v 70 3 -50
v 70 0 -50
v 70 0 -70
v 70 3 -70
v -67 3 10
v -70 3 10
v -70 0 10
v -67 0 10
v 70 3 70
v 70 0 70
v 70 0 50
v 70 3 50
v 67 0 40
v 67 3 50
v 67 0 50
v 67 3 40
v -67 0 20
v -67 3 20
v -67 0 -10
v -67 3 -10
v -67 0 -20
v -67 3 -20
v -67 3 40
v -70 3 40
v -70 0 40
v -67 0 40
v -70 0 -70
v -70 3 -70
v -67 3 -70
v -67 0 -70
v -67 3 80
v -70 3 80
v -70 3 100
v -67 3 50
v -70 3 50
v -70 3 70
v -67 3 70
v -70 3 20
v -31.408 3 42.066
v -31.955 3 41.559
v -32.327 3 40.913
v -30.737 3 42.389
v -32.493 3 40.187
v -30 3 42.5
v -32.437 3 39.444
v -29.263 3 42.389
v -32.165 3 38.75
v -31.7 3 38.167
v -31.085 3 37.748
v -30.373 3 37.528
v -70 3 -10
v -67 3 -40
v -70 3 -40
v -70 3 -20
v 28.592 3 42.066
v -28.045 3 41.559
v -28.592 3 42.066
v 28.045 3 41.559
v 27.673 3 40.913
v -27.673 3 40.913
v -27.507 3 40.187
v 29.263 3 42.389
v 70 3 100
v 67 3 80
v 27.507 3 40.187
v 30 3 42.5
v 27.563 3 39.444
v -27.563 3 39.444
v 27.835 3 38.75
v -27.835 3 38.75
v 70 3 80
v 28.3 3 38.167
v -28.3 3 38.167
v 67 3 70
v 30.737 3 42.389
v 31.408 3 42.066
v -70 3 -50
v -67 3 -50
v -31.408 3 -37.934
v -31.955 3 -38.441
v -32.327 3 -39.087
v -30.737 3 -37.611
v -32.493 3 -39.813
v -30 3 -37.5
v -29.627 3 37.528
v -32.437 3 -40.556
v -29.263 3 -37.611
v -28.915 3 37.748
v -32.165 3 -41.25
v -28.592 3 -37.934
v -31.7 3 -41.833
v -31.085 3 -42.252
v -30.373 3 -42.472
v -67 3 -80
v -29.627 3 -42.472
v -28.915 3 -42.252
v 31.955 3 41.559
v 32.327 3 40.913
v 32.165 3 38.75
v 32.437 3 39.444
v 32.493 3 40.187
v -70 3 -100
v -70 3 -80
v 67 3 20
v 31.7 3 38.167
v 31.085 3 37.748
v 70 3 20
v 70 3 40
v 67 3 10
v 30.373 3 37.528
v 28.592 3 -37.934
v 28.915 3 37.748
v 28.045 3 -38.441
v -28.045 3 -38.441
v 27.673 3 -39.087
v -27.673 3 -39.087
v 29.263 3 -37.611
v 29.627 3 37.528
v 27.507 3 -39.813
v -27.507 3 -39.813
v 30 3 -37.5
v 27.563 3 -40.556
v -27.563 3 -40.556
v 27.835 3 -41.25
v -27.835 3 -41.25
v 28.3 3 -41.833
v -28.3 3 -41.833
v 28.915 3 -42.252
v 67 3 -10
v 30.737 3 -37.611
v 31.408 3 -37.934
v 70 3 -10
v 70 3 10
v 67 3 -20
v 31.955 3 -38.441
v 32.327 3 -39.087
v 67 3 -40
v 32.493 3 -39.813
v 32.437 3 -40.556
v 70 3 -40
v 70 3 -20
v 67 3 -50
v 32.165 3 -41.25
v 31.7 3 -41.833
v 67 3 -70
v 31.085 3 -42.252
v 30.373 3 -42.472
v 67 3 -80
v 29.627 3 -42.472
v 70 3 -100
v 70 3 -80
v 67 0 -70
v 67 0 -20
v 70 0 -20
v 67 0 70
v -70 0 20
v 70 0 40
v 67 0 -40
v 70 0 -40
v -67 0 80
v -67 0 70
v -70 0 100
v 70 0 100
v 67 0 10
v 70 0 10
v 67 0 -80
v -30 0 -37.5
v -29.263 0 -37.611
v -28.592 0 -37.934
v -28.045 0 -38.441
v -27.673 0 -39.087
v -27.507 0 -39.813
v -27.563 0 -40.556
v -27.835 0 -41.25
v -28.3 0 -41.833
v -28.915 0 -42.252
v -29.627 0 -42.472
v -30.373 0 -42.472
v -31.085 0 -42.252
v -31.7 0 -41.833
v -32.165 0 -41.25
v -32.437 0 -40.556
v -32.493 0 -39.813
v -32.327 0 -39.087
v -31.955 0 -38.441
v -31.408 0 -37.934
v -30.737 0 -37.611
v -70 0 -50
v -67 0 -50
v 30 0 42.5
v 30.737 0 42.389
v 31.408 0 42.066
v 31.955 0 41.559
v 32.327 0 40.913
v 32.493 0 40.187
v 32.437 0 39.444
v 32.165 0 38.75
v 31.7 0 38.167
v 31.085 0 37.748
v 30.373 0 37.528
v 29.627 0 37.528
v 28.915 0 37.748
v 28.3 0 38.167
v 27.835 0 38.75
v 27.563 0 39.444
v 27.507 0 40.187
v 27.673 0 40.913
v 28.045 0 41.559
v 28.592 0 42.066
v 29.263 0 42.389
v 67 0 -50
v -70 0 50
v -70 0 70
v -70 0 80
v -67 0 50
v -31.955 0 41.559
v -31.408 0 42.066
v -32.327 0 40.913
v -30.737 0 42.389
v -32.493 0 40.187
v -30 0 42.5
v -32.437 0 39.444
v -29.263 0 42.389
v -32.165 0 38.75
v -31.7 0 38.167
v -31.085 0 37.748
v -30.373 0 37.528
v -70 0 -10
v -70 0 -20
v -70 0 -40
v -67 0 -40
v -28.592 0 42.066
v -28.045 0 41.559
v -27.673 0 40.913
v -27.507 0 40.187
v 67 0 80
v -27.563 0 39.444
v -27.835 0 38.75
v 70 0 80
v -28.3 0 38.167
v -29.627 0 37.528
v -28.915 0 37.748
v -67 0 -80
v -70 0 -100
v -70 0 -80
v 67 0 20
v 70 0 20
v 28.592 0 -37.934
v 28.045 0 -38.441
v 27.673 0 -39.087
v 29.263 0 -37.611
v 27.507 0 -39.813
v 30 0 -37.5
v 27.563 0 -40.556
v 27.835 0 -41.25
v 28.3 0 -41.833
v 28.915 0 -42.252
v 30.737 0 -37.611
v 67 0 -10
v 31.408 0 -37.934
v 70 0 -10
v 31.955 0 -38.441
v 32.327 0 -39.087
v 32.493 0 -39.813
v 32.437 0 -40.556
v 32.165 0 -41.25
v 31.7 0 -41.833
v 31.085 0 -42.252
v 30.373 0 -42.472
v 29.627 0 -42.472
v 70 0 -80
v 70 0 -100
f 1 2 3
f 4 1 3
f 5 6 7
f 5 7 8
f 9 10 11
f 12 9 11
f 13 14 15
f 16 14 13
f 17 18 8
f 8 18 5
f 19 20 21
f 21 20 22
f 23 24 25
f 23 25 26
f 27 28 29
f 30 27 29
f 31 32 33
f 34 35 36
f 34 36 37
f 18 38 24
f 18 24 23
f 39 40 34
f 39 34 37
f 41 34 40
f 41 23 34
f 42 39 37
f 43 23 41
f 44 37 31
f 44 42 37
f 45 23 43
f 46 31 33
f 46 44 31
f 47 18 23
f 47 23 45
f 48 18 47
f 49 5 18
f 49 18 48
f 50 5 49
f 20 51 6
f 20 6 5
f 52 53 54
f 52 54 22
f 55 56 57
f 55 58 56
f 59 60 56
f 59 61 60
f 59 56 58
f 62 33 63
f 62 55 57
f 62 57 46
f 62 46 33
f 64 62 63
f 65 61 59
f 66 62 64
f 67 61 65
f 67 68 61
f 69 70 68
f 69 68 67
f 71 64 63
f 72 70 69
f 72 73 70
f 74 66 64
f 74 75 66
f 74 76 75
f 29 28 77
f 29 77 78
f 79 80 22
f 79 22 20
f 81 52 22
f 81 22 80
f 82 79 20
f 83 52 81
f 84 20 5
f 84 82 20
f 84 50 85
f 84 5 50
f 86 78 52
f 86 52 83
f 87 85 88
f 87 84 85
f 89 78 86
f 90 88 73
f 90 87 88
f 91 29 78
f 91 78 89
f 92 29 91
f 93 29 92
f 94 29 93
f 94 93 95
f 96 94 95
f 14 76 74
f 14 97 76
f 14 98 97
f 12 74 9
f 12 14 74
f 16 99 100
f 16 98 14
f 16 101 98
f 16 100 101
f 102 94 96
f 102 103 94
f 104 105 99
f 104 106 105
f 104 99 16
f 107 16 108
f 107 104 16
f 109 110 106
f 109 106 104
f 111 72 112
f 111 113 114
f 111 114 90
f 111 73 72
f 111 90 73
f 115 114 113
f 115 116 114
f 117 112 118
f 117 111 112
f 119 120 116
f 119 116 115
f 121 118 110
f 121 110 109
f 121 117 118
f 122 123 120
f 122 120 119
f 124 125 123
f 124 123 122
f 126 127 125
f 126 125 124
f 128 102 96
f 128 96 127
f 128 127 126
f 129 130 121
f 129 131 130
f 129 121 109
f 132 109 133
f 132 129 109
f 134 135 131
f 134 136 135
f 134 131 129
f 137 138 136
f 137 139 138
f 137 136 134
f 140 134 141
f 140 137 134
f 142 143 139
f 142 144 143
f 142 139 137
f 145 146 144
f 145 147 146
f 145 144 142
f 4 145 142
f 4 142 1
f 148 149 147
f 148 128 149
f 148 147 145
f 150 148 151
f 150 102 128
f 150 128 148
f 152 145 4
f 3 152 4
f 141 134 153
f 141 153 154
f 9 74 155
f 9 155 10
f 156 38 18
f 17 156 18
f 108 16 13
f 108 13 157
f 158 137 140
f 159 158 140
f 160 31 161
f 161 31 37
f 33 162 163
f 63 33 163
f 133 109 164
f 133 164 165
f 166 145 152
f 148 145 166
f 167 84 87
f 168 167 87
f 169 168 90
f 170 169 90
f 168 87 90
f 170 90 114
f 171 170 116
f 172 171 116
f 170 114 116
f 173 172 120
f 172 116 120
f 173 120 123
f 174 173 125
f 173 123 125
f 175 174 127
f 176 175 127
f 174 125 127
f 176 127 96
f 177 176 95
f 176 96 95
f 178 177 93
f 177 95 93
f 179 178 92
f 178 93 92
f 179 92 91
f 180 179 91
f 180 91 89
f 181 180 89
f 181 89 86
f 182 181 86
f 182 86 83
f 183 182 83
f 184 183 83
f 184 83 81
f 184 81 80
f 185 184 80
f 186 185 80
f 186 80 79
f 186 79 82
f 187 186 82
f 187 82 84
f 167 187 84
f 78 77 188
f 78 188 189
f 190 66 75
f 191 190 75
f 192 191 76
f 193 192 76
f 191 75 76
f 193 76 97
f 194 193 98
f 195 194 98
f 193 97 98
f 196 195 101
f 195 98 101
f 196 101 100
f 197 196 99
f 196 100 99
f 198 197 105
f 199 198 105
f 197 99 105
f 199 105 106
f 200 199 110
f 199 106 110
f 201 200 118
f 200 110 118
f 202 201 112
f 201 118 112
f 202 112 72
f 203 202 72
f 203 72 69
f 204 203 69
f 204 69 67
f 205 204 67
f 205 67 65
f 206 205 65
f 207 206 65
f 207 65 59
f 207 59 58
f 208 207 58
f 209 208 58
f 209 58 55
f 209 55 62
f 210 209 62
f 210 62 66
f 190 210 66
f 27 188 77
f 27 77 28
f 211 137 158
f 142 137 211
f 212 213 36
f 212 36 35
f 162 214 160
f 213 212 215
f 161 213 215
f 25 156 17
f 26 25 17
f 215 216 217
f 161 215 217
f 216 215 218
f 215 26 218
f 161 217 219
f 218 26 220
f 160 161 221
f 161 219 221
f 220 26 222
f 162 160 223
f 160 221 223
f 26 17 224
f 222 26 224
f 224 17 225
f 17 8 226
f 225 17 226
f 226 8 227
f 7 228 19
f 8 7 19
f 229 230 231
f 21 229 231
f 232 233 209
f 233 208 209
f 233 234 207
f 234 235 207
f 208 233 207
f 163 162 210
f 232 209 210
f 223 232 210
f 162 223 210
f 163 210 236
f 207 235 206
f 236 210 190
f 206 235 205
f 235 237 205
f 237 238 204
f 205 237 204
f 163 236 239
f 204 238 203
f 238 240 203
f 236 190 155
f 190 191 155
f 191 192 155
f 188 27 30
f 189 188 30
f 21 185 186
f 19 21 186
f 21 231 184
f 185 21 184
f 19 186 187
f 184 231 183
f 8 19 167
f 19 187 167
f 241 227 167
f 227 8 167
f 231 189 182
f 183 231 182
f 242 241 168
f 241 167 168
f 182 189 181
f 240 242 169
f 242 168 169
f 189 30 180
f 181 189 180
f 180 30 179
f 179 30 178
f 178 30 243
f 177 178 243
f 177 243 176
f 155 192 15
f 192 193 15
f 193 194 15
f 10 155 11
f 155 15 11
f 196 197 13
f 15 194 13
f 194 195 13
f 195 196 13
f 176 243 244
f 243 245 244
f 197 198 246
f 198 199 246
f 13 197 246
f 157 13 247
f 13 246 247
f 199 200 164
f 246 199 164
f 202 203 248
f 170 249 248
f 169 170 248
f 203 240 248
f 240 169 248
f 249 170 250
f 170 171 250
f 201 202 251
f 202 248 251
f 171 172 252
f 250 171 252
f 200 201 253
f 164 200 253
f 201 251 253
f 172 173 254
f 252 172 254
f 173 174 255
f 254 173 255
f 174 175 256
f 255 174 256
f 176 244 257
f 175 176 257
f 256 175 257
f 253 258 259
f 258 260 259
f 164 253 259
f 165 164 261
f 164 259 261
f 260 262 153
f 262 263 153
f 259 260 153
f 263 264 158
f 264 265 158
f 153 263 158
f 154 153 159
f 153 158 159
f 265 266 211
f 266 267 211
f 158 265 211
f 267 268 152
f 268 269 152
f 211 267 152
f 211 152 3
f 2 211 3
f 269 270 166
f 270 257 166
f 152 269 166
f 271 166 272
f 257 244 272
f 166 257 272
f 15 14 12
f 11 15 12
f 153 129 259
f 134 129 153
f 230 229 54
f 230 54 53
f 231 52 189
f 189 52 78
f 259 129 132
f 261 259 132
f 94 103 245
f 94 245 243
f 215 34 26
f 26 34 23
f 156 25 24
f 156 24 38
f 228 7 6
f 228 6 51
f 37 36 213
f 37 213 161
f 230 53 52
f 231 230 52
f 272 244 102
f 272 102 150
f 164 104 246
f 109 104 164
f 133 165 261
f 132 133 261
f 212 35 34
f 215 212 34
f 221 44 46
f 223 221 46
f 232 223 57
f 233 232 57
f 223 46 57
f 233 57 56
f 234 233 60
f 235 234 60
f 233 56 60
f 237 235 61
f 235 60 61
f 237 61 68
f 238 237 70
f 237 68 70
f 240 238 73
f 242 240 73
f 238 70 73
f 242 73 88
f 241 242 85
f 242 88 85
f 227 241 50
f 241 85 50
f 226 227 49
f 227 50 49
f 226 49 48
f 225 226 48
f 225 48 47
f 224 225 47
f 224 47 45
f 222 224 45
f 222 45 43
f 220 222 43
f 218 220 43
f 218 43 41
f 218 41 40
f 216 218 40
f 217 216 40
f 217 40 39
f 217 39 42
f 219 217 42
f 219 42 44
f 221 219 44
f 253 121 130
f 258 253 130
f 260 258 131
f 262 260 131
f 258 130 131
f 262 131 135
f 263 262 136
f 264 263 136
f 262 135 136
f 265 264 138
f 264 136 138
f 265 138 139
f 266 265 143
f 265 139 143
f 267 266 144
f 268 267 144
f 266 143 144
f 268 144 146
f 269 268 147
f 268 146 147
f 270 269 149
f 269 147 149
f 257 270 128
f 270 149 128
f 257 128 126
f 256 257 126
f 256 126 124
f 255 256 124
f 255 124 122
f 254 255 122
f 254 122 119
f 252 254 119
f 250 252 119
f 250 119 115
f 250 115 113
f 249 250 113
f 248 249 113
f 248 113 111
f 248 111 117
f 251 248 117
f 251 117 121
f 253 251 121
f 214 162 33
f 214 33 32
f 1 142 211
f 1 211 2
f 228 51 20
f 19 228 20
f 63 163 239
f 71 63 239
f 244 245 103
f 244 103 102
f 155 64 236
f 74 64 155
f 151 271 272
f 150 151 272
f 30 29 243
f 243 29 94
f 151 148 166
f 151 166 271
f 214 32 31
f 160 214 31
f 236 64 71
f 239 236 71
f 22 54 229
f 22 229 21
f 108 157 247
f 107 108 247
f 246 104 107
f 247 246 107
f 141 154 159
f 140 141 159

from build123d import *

# Parameters (mm, degrees)
SKETCH1_W           = 140
SKETCH1_H           = 200
BOSS_EXTRUDE1_DEPTH = 3
SKETCH2_R           = 2.5
CUT_EXTRUDE1_DEPTH  = 10
SKETCH3_W           = 3
SKETCH3_H           = 10
CUT_EXTRUDE2_DEPTH  = 10


with BuildPart() as part:
    # Sketch1 → Boss-Extrude1 (new body)
    with BuildSketch(Plane(origin=(0, 0, 0), x_dir=(1, 0, 0), z_dir=(0, 1, 0))):
        Rectangle(SKETCH1_W, SKETCH1_H)
    extrude(amount=BOSS_EXTRUDE1_DEPTH)

    # Sketch2 → Cut-Extrude1 (cut)
    with BuildSketch(Plane(origin=(0, 3, 0), x_dir=(1, 0, 0), z_dir=(0, 1, 0))):
        with Locations(Location((-30, 40, 0), (0, 0, 270))):
            Circle(SKETCH2_R)
        with Locations(Location((30, 40, 0), (0, 0, 270))):
            Circle(SKETCH2_R)
        with Locations(Location((-30, -40, 0), (0, 0, 270))):
            Circle(SKETCH2_R)
        with Locations(Location((30, -40, 0), (0, 0, 270))):
            Circle(SKETCH2_R)
    extrude(amount=-CUT_EXTRUDE1_DEPTH, mode=Mode.SUBTRACT)

    # Sketch3 → Cut-Extrude2 (cut)
    with BuildSketch(Plane(origin=(0, 3, 0), x_dir=(1, 0, 0), z_dir=(0, 1, 0))):
        with Locations((68.5, -45)):
            Rectangle(SKETCH3_W, SKETCH3_H)
        with Locations((68.5, -75)):
            Rectangle(SKETCH3_W, SKETCH3_H)
        with Locations((68.5, -15)):
            Rectangle(SKETCH3_W, SKETCH3_H)
        with Locations((68.5, 15)):
            Rectangle(SKETCH3_W, SKETCH3_H)
        with Locations((68.5, 45)):
            Rectangle(SKETCH3_W, SKETCH3_H)
        with Locations((68.5, 75)):
            Rectangle(SKETCH3_W, SKETCH3_H)
        with Locations((-68.5, -75)):
            Rectangle(SKETCH3_W, SKETCH3_H)
        with Locations((-68.5, -45)):
            Rectangle(SKETCH3_W, SKETCH3_H)
        with Locations((-68.5, -15)):
            Rectangle(SKETCH3_W, SKETCH3_H)
        with Locations((-68.5, 15)):
            Rectangle(SKETCH3_W, SKETCH3_H)
        with Locations((-68.5, 45)):
            Rectangle(SKETCH3_W, SKETCH3_H)
        with Locations((-68.5, 75)):
            Rectangle(SKETCH3_W, SKETCH3_H)
    extrude(amount=-CUT_EXTRUDE2_DEPTH, mode=Mode.SUBTRACT)


solid = part.part
